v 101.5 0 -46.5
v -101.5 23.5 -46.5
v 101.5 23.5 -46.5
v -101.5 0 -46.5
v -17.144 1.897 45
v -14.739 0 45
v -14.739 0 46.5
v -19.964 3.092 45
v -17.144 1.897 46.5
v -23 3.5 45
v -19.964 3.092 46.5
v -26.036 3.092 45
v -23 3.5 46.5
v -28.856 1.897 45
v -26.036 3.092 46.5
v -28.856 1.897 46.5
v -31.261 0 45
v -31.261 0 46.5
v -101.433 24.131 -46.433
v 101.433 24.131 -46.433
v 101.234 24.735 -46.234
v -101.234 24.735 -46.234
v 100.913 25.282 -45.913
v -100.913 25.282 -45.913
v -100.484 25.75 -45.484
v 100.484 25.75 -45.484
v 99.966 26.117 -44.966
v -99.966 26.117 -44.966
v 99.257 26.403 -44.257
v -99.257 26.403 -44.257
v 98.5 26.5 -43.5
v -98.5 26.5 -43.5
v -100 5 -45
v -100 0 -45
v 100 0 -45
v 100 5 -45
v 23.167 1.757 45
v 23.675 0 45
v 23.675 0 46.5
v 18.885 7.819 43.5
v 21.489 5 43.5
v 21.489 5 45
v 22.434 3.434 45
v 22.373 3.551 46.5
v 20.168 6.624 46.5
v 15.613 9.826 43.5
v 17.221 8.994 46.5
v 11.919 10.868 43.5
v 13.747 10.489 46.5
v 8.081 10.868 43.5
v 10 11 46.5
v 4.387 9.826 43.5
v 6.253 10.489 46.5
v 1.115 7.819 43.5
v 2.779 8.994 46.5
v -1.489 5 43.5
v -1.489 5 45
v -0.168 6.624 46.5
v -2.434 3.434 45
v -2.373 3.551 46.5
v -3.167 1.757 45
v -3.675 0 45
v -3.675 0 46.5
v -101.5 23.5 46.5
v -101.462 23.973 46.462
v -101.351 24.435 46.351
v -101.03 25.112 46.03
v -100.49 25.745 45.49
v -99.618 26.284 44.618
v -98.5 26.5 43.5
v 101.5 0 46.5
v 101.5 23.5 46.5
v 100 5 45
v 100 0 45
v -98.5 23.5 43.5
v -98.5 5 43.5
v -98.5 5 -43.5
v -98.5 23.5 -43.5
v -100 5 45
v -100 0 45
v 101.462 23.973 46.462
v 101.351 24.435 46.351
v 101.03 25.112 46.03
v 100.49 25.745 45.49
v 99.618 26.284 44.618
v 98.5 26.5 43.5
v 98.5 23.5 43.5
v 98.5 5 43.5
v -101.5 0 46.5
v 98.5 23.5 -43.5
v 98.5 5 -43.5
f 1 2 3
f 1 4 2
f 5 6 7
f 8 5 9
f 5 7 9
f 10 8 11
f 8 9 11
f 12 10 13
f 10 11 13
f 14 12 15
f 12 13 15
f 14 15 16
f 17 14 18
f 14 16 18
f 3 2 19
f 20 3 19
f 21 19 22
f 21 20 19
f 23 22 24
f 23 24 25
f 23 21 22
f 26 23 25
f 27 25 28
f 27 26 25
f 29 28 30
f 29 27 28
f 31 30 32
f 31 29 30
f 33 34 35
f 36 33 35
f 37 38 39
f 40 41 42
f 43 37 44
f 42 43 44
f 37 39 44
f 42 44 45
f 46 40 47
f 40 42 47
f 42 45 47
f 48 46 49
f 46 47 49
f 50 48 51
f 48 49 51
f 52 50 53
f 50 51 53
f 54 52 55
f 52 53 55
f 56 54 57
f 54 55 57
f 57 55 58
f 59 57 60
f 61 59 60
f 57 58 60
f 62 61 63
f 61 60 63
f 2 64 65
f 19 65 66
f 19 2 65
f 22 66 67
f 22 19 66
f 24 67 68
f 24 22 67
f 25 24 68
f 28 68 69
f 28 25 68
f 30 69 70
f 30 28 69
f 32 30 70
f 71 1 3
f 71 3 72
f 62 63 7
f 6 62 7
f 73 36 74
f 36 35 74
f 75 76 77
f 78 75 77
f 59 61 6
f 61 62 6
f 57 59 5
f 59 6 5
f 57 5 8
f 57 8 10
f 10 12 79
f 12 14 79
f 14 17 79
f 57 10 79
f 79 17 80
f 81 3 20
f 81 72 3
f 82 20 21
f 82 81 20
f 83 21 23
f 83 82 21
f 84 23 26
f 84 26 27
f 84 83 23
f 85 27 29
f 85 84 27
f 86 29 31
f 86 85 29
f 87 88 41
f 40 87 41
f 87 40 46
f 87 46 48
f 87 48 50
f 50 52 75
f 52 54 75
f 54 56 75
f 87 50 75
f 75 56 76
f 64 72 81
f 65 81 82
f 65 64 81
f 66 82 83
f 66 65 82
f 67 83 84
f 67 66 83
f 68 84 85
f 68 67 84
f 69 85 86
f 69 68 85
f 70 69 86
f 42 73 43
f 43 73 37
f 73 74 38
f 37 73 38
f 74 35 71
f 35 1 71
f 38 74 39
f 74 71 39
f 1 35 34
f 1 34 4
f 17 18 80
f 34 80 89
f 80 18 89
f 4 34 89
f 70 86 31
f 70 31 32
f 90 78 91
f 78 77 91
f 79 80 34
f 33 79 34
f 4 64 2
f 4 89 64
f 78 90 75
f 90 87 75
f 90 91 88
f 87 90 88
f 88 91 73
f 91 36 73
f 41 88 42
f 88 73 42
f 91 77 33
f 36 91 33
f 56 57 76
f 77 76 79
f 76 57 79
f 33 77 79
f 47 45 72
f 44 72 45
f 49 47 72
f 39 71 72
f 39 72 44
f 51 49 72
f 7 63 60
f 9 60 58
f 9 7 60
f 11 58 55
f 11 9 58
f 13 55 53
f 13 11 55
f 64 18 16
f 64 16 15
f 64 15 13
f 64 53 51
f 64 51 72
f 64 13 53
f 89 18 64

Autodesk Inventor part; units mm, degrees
sketch "Sketch8" plane through (0, 0, 0) normal (0, 1, 0) x (-1, 0, 0)
  line L0 (101.5, -46.5) -> (-101.5, -46.5)
  line L1 (-101.5, -46.5) -> (-101.5, 46.5)
  line L2 (-101.5, 46.5) -> (101.5, 46.5)
  line L3 (101.5, 46.5) -> (101.5, -46.5)
  line L4 (101.5, -46.5) -> (-101.5, 46.5) construction
  line L5 (-101.5, -46.5) -> (101.5, 46.5) construction
  point P0 (0, 0)
  dimension "d19" = 203
  dimension "d20" = 93
extrude "Extrusion4" add sketch "Sketch8" along normal blind 26.5
shell "Shell3" thickness 3 removed faces 1 at (-33.8333, 0, 15.5)
sketch "Sketch11" plane through (0, 0, 0) normal (0, 1, 0) x (-1, 0, 0)
  line L0 (-100, 45) -> (100, 45)
  line L1 (100, 45) -> (100, -45)
  line L2 (100, -45) -> (-100, -45)
  line L3 (-100, -45) -> (-100, 45)
  line L4 (-100, 45) -> (100, -45) construction
  line L5 (100, 45) -> (-100, -45) construction
  point P0 (0, 0)
  dimension "d28" = 200
  dimension "d29" = 90
extrude "Extrusion6" cut sketch "Sketch11" along normal blind 5
fillet "Fillet1" radius 3 4 edges at (0, 26.5, 46.5) (101.5, 26.5, 0) (0, 26.5, -46.5) (-101.5, 26.5, 0)
sketch "Sketch13" plane through (-101.5, 0, 46.5) normal (0, 0, 1) x (1, 0, 0)
  circle A0 centre (111.5, -3) radius 14
  circle A1 centre (78.5, -8) radius 11.5
  line L0 (-40.6, 0) -> (243.6, 0) projected
  line L1 (203, 0) -> (203, 23.5) projected
  point P0 (101.5, 0)
  dimension "d74" = 28
  dimension "d75" = 23
  dimension "d76" = 3
  dimension "d77" = 91.5
  dimension "d78" = 124.5
  dimension "d79" = 8
extrude "Extrusion8" cut sketch "Sketch13" against normal blind 10
properties part number "top"
